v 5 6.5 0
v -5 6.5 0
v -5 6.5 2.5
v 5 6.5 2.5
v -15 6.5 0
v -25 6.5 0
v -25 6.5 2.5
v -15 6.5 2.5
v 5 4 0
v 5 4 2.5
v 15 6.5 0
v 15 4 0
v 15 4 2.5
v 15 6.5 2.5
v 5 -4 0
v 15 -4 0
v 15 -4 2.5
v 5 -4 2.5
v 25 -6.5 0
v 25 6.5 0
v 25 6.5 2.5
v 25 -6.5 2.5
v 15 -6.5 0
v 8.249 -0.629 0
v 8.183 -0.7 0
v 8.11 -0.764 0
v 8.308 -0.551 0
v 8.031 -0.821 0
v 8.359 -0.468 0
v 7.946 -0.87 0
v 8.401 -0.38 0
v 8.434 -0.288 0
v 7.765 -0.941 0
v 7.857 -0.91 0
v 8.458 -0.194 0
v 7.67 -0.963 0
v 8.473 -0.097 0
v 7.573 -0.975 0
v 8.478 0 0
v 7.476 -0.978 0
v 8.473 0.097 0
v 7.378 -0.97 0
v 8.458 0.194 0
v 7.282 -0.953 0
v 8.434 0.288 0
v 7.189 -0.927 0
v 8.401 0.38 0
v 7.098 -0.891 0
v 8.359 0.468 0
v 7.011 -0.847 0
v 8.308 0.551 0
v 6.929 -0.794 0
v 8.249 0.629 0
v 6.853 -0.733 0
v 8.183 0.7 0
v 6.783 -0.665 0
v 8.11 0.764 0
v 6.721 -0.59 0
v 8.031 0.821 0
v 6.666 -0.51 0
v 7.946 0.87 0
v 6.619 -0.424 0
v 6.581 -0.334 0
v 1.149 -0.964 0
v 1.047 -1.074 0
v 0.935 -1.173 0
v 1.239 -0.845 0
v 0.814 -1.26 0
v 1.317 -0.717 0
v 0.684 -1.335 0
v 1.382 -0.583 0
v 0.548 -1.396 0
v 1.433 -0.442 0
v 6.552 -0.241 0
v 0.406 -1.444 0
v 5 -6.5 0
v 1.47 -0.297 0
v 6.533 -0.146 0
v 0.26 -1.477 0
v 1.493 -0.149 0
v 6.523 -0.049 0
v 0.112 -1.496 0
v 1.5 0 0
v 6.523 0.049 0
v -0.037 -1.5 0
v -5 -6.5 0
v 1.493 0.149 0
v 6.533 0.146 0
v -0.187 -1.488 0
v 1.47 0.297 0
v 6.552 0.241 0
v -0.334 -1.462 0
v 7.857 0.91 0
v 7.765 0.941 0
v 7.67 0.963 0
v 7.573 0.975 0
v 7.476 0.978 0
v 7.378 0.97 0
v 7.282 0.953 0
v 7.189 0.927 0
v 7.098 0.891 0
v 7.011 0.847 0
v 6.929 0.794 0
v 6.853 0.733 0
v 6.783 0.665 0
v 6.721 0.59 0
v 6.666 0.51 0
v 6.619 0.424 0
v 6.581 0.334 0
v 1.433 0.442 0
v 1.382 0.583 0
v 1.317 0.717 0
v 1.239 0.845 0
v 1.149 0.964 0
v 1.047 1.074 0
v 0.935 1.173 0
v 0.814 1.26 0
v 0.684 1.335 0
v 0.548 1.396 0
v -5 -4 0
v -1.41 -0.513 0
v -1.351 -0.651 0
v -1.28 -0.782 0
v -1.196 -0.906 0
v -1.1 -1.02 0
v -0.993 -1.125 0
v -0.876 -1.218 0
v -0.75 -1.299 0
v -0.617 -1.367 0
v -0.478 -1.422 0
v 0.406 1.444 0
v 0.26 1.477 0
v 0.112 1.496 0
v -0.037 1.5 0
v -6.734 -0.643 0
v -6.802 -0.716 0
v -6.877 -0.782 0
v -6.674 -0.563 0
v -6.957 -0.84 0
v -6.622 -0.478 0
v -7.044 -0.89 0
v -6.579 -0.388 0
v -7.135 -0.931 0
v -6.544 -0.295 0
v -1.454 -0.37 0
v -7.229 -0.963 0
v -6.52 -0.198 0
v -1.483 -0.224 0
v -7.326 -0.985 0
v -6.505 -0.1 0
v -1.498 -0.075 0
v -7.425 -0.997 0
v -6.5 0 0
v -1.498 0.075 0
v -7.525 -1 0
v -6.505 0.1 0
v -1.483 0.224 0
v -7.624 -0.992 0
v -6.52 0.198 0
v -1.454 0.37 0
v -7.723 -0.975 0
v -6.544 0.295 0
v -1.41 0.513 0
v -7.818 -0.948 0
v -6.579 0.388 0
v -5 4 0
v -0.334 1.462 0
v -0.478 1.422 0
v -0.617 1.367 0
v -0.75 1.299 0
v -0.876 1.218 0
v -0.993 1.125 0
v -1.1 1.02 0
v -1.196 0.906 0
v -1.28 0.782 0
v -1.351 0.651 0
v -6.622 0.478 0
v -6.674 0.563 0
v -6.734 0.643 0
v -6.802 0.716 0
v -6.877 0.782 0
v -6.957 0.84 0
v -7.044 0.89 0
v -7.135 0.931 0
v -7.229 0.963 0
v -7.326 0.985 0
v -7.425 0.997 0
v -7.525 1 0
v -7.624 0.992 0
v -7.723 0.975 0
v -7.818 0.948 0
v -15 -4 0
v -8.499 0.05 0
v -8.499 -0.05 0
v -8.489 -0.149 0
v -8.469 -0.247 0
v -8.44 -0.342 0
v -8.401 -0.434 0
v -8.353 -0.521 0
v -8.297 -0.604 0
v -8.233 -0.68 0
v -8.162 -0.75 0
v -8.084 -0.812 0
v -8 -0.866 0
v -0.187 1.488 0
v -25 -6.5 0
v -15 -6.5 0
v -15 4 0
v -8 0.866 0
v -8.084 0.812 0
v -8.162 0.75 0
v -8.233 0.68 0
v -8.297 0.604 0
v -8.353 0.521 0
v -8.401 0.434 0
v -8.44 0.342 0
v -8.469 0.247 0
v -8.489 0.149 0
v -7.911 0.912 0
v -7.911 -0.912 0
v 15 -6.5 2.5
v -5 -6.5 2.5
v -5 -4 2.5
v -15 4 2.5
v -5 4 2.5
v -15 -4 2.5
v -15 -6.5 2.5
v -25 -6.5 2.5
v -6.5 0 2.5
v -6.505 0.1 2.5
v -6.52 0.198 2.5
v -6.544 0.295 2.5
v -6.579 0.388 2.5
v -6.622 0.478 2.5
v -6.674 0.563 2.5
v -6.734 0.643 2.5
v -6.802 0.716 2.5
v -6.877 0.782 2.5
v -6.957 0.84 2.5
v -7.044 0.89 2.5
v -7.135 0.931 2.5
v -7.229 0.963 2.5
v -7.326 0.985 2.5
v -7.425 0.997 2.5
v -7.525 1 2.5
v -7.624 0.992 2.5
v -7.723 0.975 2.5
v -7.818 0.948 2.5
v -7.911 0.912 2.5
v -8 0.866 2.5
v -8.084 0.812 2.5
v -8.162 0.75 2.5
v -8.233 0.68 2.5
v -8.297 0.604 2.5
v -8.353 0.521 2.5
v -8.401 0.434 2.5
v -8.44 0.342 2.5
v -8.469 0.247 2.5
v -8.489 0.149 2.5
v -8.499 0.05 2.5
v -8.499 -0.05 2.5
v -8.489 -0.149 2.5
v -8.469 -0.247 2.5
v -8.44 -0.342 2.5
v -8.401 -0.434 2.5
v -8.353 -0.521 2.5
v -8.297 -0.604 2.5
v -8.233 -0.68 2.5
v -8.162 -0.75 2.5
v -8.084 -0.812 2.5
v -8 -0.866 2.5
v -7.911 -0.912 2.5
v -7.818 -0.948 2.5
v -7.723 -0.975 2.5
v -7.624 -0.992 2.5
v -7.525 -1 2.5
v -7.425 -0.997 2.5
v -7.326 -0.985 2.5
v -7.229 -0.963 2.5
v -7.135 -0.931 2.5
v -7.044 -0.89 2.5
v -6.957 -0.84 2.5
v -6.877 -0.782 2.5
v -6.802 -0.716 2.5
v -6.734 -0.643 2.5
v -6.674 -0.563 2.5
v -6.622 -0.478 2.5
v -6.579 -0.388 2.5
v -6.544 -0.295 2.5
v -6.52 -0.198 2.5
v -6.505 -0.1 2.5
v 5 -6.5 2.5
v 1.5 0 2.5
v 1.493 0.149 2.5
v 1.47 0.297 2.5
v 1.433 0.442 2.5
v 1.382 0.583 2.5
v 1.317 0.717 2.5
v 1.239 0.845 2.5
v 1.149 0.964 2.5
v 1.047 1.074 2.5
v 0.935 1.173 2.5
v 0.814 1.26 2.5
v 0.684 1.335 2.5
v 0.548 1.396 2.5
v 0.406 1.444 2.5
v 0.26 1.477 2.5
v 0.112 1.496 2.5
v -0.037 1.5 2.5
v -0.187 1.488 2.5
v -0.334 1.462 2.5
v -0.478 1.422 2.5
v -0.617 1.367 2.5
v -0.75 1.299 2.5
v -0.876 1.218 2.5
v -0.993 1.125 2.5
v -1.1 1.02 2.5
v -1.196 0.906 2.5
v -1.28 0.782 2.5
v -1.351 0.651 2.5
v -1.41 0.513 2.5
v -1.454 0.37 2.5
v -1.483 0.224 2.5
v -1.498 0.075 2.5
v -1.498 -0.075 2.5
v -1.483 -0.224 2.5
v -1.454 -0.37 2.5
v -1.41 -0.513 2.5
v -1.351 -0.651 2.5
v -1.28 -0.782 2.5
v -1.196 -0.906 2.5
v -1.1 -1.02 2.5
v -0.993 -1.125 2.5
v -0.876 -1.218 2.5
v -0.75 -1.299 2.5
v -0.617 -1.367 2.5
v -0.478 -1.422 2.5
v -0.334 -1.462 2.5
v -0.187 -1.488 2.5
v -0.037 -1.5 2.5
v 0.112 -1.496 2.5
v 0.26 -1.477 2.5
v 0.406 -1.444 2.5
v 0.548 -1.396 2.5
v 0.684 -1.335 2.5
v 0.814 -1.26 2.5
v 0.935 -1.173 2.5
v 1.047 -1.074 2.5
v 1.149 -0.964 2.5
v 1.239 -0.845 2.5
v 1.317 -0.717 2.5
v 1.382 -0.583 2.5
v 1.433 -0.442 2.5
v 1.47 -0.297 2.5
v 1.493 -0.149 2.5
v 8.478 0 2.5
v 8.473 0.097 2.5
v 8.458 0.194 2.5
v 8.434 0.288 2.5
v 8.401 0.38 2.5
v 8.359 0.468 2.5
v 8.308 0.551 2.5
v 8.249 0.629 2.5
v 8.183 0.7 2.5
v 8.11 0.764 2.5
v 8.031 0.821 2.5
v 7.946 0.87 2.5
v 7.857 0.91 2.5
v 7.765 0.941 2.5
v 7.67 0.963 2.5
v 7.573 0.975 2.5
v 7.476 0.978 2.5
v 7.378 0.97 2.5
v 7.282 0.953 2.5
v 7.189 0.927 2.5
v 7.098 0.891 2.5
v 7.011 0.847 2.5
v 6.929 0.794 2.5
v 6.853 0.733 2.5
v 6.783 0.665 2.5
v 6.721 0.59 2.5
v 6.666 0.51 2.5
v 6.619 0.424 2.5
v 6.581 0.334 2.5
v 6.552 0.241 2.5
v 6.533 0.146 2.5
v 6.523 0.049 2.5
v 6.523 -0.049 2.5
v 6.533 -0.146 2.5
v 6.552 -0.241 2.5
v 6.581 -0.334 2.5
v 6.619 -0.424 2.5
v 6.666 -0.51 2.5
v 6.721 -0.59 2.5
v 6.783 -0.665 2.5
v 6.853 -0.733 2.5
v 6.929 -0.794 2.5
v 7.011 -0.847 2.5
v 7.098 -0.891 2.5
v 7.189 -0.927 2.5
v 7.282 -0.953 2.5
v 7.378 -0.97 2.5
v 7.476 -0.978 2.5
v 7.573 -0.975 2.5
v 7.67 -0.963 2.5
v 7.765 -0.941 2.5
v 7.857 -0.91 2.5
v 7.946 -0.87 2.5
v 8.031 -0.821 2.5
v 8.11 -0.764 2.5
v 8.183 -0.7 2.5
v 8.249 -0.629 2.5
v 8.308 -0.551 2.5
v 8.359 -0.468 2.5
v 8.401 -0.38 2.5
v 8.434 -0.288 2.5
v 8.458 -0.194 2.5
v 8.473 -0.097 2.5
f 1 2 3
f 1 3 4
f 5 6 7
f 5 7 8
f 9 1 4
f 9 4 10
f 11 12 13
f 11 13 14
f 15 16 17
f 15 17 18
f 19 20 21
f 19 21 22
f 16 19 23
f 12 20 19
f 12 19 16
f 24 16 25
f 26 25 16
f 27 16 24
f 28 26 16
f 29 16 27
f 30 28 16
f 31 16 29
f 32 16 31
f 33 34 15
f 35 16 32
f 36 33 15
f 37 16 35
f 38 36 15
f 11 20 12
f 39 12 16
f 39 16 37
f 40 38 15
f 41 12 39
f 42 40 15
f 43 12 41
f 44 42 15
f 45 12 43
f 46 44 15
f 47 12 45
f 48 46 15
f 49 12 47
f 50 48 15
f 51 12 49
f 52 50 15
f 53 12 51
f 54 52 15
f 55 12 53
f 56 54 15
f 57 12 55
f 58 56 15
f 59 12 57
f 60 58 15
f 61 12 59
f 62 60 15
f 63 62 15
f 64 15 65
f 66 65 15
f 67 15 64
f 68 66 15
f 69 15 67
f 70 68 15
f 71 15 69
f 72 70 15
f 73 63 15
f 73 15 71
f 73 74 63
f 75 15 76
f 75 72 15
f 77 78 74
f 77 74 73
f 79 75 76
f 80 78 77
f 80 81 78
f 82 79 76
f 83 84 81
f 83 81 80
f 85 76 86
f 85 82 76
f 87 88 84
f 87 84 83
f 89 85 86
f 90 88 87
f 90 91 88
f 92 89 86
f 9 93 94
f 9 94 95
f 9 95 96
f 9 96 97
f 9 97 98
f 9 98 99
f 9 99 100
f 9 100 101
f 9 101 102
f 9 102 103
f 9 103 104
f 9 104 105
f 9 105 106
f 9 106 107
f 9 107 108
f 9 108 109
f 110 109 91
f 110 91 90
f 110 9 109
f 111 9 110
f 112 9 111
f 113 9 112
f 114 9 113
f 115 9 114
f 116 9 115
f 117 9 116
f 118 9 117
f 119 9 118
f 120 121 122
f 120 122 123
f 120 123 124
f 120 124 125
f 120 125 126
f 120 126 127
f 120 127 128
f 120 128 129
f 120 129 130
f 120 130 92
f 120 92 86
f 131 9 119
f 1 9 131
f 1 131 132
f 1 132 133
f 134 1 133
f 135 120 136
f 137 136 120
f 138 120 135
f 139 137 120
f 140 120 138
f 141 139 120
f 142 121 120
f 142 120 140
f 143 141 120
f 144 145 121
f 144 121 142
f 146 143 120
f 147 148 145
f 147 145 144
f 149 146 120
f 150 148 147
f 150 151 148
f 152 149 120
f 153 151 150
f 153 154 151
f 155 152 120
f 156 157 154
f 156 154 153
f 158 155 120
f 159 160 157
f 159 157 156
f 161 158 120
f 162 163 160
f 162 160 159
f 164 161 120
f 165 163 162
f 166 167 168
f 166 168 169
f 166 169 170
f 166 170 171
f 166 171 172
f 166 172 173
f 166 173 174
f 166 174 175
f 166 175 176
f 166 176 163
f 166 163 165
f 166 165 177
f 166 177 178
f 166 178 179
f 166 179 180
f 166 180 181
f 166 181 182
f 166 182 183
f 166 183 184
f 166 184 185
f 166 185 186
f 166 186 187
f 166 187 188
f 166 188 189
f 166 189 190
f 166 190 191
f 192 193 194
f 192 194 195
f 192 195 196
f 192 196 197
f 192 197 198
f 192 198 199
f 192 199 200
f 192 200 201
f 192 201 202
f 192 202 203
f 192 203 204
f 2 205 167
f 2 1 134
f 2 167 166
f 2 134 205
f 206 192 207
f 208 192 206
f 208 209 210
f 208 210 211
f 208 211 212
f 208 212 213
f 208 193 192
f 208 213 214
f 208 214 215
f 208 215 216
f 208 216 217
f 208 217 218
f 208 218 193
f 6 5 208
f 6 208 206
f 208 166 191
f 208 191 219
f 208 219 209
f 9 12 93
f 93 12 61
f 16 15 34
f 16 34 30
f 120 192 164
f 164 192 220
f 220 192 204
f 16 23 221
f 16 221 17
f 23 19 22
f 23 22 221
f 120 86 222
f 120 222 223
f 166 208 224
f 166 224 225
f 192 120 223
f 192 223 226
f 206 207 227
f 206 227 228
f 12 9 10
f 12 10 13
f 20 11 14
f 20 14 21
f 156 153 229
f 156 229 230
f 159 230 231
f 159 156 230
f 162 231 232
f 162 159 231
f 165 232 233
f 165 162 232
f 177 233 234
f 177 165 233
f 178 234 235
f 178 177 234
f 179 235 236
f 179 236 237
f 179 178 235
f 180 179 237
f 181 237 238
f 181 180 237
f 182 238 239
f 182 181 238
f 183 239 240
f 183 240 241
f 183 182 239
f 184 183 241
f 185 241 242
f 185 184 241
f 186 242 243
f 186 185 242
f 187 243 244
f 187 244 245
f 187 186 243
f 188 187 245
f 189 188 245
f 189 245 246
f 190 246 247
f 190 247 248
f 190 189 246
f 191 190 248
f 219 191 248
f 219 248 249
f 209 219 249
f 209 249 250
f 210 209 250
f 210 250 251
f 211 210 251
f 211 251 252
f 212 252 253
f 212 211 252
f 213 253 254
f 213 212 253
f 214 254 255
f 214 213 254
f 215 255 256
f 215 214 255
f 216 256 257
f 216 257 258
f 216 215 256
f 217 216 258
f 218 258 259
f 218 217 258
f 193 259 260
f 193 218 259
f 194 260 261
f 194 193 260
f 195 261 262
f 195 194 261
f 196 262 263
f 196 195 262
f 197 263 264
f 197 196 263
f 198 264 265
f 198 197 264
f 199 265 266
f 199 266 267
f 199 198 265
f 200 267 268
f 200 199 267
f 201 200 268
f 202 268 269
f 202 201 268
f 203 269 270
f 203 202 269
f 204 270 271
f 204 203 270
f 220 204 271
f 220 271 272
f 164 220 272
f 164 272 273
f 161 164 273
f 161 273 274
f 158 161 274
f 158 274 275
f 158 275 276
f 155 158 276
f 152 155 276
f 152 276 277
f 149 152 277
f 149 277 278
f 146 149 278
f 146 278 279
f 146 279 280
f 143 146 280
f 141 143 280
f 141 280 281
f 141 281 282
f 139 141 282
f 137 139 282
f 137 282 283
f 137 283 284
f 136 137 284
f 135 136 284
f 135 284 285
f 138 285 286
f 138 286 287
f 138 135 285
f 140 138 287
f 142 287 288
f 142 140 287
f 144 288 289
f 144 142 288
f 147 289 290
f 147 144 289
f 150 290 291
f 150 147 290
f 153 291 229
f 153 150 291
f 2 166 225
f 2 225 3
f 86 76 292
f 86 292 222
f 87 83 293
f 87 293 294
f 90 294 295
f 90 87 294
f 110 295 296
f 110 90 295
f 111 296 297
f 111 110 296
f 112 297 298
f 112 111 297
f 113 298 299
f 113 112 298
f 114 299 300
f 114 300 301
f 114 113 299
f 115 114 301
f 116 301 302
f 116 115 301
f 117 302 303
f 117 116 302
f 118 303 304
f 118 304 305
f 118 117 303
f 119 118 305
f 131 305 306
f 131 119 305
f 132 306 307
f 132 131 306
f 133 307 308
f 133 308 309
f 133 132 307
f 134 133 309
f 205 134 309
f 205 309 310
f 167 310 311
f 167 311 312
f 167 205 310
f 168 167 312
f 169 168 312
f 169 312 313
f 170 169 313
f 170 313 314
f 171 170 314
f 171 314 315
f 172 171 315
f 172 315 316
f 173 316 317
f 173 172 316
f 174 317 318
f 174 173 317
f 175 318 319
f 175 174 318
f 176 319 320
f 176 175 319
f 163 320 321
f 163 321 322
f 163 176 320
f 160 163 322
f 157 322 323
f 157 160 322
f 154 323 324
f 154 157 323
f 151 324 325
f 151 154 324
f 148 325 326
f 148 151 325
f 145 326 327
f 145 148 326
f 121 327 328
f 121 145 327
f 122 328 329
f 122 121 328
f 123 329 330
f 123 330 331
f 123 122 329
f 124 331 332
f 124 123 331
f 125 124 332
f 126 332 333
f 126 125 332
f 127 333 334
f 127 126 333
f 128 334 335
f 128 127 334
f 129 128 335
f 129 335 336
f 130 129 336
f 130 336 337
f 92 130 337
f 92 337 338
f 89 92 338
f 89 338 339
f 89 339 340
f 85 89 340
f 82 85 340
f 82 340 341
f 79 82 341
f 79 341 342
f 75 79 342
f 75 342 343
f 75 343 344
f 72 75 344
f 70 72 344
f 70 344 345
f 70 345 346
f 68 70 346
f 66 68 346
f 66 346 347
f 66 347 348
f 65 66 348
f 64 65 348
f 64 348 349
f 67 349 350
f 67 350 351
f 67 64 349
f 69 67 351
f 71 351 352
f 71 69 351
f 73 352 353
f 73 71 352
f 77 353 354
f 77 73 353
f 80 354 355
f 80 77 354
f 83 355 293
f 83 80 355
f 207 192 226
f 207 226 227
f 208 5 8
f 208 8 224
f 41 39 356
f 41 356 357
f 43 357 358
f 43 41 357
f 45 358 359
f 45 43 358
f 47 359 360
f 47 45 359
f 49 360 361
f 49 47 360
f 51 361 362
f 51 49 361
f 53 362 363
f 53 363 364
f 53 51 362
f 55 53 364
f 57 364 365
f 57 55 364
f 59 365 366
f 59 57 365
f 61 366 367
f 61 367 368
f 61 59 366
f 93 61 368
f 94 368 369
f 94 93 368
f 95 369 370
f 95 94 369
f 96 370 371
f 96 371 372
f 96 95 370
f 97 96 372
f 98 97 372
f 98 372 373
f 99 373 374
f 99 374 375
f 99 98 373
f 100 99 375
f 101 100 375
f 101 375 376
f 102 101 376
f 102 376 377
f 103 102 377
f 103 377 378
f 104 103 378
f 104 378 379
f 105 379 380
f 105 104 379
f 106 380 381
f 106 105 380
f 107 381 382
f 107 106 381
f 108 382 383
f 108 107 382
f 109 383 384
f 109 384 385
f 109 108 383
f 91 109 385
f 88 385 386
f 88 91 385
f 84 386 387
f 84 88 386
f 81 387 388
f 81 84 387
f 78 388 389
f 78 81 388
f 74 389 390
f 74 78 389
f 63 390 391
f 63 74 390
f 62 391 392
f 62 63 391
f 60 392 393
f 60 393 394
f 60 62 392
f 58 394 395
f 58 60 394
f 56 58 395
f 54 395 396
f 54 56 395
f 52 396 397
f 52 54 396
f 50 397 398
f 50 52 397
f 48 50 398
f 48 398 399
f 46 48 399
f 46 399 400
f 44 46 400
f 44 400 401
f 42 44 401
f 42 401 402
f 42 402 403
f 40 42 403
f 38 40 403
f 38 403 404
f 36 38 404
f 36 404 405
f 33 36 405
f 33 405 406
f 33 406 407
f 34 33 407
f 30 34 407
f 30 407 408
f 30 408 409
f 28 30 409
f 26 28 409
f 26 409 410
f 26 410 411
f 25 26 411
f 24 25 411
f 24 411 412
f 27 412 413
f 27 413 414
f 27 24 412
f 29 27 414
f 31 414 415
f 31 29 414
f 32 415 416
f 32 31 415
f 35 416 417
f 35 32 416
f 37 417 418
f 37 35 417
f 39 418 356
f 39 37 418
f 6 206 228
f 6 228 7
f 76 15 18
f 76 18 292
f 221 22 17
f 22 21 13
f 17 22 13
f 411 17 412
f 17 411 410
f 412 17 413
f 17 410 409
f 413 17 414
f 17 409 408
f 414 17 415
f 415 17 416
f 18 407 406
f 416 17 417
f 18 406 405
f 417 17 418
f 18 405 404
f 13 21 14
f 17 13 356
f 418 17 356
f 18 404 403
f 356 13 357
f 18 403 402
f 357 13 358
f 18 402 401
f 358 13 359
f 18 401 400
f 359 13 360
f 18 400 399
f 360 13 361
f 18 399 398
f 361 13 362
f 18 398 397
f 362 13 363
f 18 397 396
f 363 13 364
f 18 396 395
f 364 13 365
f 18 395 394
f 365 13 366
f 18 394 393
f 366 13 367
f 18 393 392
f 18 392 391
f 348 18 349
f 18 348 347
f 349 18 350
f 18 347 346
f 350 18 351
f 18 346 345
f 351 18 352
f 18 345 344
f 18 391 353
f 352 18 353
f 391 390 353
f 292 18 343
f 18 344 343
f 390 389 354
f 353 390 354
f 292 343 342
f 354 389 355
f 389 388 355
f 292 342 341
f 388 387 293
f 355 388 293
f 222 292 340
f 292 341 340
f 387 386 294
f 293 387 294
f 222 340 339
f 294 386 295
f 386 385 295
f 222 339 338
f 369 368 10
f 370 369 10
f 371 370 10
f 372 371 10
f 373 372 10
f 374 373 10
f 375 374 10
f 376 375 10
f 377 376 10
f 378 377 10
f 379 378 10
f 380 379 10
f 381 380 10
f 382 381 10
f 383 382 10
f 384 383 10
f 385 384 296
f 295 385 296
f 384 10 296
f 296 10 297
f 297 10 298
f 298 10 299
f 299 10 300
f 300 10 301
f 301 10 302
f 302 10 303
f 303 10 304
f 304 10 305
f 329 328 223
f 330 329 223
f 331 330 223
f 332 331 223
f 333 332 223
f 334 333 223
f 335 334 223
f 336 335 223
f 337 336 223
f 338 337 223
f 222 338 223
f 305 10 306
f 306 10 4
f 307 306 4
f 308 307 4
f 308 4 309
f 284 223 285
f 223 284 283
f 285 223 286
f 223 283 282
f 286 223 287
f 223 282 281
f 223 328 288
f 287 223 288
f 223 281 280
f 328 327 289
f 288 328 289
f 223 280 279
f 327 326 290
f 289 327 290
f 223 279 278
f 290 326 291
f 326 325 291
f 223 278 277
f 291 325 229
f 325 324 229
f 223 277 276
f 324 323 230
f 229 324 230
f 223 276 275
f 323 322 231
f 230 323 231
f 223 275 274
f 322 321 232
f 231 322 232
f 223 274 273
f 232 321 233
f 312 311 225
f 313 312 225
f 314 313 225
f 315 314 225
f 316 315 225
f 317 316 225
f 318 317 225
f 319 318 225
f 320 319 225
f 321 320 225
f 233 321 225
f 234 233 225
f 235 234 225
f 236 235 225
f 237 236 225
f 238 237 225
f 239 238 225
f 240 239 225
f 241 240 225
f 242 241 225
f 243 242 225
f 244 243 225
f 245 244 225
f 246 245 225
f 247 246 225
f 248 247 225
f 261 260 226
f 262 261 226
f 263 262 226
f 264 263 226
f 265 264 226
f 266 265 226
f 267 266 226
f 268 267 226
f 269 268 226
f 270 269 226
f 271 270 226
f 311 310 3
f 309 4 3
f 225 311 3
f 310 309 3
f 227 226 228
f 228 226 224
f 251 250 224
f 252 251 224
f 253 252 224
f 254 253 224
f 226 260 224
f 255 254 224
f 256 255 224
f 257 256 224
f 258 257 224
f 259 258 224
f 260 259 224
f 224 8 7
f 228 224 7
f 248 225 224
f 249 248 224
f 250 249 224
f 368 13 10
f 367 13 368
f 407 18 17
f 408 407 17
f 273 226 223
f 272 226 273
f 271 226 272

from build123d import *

# Parameters (mm, degrees)
CROQUIS1_R              = 1.5
CROQUIS1_R_2            = 0.977820283
CROQUIS1_R_3            = 1
SALIENTE_EXTRUIR1_DEPTH = 2.5


with BuildPart() as part:
    # Croquis1 → Saliente-Extruir1 (new body)
    with BuildSketch(Plane.XY):
        Polygon((-25, 6.5), (-15, 6.5), (-15, 4), (-5, 4), (-5, 6.5), (5, 6.5), (5, 4), (15, 4), (15, 6.5), (25, 6.5), (25, -6.5), (15, -6.5), (15, -4), (5, -4), (5, -6.5), (-5, -6.5), (-5, -4), (-15, -4), (-15, -6.5), (-25, -6.5), align=None)
        Circle(CROQUIS1_R, mode=Mode.SUBTRACT)
        with Locations((7.5, 0)):
            Circle(CROQUIS1_R_2, mode=Mode.SUBTRACT)
        with Locations((-7.5, 0)):
            Circle(CROQUIS1_R_3, mode=Mode.SUBTRACT)
    extrude(amount=SALIENTE_EXTRUIR1_DEPTH)


solid = part.part
